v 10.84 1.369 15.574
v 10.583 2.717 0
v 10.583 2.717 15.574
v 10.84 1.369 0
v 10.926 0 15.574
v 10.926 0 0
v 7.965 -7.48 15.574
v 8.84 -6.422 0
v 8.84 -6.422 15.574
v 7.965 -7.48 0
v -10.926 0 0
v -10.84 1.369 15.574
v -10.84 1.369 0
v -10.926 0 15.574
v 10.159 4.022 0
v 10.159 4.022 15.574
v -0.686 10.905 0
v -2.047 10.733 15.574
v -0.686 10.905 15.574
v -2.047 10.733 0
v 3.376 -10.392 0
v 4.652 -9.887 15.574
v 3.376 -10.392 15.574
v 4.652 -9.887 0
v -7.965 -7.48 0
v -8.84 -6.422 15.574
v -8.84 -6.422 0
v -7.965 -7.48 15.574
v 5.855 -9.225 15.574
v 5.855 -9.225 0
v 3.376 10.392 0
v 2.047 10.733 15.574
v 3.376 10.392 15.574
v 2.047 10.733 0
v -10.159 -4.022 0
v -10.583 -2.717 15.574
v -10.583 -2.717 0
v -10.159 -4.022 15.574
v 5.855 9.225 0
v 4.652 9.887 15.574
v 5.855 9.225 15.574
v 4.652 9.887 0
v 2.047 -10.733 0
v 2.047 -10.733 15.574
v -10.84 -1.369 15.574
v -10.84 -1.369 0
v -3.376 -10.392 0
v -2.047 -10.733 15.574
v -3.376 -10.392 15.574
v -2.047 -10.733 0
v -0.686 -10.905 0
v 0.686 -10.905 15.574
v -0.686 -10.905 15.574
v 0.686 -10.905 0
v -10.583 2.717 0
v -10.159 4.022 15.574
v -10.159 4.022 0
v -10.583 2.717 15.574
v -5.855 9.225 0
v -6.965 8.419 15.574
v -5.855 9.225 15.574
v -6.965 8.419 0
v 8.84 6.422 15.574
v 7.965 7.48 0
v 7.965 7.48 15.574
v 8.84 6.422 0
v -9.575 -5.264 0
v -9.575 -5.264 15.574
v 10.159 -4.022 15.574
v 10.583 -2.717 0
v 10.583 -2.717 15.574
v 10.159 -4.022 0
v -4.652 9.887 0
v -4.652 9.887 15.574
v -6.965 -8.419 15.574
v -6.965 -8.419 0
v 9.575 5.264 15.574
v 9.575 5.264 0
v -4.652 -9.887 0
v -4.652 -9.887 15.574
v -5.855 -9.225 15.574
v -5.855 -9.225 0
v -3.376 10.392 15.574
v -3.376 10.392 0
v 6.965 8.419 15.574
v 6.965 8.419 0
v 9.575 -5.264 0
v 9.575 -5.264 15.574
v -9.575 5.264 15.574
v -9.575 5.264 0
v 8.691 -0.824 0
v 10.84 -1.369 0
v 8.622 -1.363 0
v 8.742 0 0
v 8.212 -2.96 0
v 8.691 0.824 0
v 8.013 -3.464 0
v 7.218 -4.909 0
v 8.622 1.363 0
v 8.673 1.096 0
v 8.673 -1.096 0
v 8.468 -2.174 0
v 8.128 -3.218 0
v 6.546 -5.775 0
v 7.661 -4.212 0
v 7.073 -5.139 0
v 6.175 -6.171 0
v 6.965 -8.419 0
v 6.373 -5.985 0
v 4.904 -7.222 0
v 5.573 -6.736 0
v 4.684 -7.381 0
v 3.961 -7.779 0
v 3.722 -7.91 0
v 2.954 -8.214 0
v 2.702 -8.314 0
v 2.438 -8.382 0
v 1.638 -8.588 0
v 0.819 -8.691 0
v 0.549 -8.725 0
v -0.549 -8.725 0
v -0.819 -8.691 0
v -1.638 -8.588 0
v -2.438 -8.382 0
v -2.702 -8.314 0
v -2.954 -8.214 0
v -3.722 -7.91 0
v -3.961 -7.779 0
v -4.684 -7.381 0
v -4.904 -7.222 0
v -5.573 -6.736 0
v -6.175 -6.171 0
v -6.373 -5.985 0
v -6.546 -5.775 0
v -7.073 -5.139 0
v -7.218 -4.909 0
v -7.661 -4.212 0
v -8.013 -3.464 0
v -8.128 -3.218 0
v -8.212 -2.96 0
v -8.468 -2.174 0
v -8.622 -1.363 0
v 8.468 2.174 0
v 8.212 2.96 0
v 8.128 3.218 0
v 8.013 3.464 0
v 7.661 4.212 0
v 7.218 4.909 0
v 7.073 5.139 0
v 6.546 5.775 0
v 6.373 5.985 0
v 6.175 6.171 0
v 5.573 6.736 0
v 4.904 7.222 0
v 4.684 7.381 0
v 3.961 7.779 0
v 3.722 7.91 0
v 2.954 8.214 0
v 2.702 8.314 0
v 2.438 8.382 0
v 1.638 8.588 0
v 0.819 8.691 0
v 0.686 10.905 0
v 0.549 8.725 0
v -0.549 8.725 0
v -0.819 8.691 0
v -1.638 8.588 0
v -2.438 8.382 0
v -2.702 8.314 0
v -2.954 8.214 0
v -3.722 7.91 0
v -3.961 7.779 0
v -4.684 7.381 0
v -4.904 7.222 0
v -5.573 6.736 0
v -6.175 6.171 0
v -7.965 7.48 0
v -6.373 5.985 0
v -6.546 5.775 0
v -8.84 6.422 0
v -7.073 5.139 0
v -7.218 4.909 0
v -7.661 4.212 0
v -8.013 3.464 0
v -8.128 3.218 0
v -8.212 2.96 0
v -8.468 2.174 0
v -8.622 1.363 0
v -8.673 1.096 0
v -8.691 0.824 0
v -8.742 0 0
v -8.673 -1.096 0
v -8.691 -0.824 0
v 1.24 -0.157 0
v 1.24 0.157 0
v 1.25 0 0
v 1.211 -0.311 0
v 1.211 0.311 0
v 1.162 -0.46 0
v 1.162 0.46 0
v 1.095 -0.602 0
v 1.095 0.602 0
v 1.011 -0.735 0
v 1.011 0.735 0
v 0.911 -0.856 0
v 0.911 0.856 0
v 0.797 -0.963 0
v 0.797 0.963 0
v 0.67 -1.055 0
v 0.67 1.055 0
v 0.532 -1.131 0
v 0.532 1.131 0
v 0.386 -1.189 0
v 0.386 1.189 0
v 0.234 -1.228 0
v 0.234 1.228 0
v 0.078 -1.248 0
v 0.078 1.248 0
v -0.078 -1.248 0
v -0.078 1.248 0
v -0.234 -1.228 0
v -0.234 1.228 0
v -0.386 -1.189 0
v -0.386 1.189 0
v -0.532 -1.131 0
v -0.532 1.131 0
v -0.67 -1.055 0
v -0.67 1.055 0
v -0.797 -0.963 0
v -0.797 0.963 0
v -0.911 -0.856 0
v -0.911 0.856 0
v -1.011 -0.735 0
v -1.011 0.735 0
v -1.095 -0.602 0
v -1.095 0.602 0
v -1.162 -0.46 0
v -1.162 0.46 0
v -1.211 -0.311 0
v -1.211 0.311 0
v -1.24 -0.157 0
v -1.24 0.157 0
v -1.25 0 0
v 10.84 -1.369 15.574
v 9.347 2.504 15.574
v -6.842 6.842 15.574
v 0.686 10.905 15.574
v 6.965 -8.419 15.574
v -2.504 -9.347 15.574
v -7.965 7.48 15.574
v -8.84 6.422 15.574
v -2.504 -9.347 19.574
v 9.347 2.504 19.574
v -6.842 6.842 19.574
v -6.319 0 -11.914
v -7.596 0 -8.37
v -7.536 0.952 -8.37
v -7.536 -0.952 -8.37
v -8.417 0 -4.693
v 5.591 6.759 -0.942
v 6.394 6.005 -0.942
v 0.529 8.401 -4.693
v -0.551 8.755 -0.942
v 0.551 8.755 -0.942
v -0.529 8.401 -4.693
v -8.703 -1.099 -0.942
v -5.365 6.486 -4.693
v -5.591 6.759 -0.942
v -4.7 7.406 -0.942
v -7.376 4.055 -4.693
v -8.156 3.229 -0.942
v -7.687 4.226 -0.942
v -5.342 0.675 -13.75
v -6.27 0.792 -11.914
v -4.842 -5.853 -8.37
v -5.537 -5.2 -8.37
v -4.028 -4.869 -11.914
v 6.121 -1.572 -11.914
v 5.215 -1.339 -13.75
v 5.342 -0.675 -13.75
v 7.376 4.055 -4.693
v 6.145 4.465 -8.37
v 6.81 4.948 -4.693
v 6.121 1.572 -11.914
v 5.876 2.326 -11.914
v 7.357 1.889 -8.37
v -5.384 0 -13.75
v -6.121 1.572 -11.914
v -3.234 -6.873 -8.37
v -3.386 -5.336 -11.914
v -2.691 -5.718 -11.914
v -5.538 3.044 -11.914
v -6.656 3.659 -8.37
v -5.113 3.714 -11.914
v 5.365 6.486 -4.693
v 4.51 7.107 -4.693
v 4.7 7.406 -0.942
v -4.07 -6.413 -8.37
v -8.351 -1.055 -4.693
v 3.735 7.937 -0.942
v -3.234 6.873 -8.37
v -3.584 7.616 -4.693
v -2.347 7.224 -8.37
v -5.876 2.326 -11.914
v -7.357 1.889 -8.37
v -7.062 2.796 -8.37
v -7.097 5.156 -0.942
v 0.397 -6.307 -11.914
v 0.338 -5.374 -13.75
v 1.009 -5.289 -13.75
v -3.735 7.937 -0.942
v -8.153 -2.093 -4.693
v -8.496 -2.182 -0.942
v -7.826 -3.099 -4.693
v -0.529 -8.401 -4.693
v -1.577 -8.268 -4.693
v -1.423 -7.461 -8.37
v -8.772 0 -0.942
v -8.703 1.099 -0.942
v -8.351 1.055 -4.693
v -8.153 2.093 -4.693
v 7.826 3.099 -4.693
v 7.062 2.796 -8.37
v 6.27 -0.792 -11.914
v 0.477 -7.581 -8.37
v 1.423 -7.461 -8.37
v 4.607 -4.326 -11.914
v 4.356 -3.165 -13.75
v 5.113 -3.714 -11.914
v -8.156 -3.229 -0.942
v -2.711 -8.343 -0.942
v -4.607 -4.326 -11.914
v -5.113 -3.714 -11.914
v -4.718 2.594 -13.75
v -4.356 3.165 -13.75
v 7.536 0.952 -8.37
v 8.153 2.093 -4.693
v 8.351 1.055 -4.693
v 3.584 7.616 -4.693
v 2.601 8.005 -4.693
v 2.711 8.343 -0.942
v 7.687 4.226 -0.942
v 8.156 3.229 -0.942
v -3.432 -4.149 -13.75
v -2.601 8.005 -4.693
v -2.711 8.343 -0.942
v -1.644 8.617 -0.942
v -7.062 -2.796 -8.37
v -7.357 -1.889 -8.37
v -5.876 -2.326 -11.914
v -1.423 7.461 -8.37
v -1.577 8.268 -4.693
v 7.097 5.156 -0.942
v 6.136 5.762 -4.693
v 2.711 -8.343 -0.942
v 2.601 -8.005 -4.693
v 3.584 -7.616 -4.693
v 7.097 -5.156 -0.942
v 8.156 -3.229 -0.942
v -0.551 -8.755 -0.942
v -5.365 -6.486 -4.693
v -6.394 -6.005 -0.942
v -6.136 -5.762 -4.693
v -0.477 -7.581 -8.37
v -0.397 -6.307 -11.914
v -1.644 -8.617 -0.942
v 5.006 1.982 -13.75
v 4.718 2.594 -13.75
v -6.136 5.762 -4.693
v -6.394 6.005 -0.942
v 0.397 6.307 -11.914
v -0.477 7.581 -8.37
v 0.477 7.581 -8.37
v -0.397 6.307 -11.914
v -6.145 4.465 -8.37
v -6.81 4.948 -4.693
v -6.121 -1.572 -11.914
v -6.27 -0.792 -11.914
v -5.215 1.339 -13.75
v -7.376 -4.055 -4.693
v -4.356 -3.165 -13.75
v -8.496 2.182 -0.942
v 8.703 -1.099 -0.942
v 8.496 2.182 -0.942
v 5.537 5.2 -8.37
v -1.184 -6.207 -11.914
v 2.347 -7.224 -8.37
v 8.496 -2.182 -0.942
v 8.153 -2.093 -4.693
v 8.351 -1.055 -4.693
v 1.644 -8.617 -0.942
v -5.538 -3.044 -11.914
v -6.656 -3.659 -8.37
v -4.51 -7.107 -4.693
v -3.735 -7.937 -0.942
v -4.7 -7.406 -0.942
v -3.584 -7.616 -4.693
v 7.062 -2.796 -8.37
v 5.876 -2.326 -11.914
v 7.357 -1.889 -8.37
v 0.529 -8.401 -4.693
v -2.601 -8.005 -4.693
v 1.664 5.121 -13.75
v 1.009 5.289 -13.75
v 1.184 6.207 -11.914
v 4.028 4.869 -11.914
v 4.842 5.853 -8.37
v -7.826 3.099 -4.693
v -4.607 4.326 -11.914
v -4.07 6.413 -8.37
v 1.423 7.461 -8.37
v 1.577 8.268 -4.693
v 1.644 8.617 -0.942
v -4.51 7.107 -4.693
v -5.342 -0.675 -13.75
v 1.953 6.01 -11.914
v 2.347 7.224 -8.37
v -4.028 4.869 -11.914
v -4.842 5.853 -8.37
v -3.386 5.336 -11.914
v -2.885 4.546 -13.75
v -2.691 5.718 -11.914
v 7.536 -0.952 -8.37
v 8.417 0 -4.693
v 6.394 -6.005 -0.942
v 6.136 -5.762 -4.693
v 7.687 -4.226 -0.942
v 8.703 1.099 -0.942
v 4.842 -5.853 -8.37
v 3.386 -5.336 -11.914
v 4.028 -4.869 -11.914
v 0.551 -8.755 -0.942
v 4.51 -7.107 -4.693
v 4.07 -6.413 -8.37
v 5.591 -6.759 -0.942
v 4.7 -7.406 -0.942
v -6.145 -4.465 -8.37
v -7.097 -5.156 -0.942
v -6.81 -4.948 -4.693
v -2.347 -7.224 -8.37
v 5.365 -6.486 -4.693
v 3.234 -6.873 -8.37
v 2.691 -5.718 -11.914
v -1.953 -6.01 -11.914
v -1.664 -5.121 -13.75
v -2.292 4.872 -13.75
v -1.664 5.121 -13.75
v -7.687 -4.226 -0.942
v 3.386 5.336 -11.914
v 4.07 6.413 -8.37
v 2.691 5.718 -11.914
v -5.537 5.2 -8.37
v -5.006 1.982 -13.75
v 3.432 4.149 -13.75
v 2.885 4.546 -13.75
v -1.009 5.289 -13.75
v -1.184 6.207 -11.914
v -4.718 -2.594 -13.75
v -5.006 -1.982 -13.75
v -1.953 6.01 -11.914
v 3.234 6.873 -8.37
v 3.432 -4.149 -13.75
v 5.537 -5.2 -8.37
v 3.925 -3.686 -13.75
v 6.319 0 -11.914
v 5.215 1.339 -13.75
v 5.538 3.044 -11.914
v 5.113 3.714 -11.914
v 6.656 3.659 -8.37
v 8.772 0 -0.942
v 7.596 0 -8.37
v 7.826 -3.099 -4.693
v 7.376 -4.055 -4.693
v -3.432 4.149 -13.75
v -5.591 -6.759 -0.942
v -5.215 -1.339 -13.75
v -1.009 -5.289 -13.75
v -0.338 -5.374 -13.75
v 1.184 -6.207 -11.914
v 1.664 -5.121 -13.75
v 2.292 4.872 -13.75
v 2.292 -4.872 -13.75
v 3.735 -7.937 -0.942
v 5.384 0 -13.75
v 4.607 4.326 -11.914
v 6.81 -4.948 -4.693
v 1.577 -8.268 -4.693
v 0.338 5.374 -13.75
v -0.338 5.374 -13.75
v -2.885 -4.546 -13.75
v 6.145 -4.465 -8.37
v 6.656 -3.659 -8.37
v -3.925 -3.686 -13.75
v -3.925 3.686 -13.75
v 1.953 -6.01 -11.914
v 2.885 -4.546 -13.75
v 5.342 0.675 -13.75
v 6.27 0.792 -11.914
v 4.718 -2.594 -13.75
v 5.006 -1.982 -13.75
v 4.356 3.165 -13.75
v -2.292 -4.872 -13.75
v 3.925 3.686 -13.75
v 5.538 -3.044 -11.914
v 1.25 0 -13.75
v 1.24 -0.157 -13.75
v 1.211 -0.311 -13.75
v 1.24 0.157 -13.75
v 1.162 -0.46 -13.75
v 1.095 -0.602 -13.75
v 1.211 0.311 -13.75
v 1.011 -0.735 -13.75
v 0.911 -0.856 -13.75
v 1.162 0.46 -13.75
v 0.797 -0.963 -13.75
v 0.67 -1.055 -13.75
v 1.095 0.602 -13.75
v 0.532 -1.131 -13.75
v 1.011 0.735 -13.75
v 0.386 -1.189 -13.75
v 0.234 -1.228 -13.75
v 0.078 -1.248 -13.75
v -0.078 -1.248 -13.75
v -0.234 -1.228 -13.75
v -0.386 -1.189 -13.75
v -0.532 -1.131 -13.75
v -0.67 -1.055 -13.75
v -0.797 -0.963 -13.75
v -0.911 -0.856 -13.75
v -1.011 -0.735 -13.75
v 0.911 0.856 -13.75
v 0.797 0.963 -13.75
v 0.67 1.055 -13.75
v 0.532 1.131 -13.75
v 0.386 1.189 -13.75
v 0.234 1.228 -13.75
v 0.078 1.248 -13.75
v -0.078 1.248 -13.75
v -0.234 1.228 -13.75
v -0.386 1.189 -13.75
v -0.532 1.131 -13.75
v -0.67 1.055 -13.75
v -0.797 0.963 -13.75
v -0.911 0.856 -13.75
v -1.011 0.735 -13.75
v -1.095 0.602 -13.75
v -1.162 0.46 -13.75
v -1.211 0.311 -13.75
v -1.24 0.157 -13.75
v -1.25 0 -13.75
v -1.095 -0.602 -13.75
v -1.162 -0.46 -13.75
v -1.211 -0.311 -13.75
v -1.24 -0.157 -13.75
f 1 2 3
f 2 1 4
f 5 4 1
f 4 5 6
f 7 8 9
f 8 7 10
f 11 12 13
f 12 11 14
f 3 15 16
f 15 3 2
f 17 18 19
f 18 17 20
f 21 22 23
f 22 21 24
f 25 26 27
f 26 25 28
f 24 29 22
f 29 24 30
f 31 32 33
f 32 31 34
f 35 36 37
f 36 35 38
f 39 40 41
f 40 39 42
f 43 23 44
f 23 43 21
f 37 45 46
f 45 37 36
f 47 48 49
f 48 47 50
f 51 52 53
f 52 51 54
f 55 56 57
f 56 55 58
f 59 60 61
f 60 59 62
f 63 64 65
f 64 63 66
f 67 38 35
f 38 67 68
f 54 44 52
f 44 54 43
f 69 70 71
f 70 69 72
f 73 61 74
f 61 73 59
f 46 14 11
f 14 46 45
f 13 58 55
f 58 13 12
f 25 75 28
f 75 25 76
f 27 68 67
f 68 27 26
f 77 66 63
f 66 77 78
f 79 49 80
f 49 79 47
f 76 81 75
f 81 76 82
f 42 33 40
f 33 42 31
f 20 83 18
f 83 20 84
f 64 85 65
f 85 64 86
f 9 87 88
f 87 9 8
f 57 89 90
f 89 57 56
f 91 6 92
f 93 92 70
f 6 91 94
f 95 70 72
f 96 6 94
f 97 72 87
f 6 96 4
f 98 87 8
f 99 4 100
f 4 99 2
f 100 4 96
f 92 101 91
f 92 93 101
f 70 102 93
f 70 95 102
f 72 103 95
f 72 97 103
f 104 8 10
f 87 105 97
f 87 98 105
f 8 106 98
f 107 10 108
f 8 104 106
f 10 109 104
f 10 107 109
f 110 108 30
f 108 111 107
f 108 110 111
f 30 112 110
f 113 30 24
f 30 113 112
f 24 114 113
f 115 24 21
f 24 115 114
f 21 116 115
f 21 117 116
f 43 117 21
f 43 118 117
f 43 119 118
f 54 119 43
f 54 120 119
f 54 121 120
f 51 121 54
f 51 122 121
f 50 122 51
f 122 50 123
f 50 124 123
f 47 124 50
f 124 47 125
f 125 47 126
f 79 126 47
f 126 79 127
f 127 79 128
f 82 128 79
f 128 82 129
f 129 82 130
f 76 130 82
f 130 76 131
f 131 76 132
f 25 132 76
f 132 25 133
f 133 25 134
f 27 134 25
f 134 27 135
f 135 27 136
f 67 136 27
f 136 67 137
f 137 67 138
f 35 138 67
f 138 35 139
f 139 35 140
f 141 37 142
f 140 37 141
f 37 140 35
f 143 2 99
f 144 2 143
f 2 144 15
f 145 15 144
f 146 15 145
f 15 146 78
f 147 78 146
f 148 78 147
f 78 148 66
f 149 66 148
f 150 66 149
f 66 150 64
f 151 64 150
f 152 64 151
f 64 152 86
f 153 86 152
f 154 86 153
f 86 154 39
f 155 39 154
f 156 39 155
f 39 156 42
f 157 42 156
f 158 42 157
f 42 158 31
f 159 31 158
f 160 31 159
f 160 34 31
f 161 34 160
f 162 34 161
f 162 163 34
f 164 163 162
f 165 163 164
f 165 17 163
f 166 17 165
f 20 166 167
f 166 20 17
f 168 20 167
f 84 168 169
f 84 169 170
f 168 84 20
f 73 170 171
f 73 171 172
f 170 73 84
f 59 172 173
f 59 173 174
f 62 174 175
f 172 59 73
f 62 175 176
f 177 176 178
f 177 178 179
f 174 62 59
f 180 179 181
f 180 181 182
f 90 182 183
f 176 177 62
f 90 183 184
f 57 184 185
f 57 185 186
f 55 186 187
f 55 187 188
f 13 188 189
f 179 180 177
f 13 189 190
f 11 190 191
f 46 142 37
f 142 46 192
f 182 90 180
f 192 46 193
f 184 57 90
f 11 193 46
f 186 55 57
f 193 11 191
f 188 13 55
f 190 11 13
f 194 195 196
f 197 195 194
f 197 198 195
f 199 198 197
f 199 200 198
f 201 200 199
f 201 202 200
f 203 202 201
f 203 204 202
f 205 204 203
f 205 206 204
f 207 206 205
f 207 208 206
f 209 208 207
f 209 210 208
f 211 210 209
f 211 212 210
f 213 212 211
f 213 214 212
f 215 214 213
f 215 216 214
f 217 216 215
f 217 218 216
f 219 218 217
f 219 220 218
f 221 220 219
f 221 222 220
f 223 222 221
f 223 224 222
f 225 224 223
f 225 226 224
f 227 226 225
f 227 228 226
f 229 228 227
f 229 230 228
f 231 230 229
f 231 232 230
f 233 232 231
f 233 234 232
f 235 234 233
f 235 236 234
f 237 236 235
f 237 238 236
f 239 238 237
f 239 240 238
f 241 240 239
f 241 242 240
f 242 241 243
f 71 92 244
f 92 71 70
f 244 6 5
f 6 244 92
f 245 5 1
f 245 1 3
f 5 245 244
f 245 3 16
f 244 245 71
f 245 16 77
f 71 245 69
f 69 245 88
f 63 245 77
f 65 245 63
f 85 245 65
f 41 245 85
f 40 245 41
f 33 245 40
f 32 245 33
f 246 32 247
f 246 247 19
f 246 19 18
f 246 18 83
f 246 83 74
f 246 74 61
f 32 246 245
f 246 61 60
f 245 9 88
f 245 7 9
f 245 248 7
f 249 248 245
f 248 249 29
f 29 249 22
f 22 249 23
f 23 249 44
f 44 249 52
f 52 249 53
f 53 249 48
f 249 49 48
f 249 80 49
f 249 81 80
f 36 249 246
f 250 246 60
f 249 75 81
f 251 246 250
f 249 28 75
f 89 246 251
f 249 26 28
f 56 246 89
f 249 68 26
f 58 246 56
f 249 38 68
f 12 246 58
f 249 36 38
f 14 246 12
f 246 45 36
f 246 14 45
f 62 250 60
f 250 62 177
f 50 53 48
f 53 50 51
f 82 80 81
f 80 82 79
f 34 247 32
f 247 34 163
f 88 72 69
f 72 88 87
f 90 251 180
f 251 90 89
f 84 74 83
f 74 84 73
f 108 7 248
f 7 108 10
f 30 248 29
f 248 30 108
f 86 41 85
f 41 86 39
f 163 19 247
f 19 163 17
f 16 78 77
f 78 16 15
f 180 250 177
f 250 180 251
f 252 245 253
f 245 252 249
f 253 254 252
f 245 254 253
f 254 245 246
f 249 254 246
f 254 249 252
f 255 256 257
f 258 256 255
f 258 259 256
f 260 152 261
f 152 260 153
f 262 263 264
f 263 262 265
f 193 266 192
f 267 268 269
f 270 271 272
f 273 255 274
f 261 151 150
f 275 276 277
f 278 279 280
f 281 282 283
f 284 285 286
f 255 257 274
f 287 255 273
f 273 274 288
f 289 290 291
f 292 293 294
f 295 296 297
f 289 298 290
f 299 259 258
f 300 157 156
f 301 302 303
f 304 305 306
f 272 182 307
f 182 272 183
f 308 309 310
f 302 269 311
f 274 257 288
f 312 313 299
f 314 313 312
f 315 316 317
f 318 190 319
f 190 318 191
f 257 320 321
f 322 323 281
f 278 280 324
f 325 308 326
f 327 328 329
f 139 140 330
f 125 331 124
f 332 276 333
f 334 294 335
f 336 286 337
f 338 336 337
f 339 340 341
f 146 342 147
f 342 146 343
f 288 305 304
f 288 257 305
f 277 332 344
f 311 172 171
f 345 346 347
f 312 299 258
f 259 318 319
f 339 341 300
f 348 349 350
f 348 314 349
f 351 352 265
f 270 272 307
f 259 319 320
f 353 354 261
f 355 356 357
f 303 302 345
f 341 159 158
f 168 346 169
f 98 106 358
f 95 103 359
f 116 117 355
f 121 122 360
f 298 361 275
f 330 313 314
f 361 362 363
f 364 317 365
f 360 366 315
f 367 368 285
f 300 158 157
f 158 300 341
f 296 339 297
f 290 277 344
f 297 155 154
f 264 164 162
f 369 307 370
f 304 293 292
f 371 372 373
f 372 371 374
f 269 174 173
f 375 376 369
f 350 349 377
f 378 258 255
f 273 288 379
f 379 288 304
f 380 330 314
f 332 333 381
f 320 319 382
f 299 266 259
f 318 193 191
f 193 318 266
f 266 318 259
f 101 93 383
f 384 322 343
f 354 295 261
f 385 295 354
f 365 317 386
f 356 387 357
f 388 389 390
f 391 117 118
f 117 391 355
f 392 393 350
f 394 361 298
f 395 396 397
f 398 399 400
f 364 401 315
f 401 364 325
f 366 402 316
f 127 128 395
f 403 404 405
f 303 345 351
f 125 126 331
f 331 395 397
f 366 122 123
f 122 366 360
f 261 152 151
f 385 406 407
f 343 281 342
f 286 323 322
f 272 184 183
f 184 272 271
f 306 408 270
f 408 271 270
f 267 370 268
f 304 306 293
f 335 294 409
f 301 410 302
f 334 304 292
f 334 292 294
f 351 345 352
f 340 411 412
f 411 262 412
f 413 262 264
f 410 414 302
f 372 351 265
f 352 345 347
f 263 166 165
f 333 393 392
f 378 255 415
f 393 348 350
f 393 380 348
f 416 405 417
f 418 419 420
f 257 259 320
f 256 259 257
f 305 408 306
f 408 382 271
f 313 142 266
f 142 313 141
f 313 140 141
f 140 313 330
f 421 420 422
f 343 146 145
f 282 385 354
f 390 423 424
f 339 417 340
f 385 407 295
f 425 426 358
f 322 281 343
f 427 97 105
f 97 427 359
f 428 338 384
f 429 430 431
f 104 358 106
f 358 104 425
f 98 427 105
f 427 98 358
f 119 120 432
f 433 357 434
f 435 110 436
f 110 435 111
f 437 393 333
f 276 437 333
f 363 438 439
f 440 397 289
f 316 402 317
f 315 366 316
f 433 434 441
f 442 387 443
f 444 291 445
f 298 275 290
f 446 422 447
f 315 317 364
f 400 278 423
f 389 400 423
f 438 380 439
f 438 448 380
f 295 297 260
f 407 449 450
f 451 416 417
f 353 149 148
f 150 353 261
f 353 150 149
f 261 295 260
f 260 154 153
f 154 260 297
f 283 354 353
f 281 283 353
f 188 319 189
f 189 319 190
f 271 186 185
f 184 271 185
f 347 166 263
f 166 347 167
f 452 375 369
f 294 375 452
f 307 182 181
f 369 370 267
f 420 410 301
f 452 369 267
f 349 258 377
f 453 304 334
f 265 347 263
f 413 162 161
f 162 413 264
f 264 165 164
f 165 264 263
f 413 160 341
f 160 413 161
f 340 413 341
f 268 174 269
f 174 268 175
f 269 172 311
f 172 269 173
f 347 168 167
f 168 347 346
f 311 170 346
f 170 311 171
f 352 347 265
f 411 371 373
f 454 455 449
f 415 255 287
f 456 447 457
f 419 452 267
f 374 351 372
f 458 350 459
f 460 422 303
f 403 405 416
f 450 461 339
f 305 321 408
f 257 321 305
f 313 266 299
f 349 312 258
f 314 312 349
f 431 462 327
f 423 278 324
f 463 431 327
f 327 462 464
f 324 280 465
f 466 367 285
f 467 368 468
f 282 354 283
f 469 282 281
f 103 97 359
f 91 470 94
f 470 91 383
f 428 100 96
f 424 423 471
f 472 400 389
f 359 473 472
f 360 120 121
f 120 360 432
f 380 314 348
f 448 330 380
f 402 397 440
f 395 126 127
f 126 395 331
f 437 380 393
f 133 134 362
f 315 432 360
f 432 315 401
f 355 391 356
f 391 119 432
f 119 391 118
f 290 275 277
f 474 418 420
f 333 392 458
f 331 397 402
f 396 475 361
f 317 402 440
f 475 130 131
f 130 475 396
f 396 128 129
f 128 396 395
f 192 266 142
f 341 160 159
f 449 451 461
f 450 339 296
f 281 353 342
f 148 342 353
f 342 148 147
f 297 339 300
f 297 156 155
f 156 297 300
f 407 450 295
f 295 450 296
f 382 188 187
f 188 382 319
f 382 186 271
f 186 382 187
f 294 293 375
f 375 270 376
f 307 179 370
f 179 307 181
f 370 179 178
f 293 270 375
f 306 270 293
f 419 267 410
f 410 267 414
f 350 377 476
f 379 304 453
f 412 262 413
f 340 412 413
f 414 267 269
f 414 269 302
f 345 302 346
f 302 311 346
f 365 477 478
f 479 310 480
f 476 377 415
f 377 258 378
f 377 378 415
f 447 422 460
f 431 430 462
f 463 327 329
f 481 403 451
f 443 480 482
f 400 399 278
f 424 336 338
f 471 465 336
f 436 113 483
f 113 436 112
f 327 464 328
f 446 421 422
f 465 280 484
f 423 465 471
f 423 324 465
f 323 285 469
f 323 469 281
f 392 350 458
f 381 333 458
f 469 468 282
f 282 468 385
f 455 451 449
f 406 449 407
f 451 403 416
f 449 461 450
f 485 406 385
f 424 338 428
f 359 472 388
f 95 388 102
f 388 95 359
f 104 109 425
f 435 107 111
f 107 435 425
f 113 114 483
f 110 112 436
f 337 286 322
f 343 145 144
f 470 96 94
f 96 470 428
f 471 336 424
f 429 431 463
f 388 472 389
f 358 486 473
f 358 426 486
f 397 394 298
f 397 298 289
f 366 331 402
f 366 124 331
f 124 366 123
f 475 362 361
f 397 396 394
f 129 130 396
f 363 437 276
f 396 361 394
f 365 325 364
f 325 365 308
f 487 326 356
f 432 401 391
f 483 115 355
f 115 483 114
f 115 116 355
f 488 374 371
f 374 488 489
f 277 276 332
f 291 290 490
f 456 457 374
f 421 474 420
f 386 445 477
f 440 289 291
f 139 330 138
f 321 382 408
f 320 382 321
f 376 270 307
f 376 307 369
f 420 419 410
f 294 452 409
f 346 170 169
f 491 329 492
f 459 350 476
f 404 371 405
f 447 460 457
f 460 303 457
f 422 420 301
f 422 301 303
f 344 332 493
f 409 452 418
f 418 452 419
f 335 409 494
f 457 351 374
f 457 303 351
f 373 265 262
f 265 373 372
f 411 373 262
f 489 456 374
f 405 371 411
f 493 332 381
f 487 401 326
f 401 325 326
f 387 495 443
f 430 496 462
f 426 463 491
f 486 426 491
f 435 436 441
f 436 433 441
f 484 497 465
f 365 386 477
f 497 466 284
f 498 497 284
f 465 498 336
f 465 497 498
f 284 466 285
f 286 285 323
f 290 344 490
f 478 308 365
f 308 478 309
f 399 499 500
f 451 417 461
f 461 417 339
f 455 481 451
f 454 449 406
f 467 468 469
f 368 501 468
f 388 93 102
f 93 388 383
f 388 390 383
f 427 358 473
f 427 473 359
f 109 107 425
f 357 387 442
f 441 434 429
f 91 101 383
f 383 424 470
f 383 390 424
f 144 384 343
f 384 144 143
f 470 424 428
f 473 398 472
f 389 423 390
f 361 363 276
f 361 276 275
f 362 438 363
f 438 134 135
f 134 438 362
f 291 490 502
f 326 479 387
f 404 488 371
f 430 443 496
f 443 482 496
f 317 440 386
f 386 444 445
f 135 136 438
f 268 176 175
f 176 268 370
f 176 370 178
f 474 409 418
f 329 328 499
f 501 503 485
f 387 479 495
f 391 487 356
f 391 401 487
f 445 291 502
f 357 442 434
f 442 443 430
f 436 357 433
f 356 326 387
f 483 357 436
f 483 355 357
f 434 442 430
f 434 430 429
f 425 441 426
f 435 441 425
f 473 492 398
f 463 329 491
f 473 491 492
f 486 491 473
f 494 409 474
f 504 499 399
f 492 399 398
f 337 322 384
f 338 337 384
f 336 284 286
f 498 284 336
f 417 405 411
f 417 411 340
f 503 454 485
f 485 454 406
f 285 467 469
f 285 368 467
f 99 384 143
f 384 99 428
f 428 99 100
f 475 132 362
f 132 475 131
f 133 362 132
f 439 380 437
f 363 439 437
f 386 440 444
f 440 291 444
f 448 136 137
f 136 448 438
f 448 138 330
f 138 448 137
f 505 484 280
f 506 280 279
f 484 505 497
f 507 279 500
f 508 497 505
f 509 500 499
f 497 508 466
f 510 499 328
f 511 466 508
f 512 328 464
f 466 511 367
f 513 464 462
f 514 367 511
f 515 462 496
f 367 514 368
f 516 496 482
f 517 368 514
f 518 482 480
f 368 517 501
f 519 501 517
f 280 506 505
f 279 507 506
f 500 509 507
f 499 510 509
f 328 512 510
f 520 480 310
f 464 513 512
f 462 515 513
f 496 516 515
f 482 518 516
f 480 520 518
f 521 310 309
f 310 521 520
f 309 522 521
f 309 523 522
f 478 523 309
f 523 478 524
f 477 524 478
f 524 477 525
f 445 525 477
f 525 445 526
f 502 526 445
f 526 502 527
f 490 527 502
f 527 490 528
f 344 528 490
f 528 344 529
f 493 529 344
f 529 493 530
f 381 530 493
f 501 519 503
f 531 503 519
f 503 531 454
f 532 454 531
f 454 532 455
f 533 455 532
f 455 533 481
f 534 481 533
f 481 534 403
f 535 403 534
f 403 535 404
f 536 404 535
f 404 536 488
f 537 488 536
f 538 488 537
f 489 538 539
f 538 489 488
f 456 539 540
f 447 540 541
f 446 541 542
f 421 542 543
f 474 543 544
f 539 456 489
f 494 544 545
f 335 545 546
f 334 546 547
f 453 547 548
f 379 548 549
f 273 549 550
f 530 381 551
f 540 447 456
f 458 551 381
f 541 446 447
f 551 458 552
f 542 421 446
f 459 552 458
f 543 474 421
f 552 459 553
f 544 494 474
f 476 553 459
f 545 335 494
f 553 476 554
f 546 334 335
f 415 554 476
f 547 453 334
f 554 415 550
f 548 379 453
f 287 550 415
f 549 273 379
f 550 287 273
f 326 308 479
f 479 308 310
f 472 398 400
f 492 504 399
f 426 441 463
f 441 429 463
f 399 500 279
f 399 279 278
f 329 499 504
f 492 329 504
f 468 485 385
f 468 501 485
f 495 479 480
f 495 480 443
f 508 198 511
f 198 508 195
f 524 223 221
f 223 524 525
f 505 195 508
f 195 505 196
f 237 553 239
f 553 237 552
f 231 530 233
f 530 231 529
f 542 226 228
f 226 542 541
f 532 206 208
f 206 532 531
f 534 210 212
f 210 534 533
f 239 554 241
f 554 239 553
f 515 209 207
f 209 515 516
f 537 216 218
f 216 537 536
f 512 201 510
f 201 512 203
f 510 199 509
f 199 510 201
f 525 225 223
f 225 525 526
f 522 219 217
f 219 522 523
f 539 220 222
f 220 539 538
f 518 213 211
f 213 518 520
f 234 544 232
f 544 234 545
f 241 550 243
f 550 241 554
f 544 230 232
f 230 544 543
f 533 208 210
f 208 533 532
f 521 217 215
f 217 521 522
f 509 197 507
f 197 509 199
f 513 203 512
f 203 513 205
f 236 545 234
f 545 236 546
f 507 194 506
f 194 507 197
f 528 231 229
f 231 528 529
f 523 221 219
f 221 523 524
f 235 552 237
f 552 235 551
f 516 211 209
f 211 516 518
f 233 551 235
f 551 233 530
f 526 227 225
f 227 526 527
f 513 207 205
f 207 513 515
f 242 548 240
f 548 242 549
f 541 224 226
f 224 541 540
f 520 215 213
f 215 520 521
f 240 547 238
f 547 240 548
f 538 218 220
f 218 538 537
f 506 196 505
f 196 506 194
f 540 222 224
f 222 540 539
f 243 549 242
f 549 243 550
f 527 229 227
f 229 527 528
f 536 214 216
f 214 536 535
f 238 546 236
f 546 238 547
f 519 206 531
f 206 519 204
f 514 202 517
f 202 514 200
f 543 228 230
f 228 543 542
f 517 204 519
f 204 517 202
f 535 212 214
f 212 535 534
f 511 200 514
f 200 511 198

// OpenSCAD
// file: hub.scad
/* Hub module for omniwheel by Shira Epstein
 * This work is licensed under the Creative Commons Attribution 4.0 International License.
 * To view a copy of this license, visit http://creativecommons.org/licenses/by/4.0/.
 */

//Variables
hub_clearance = 1.5; //Clearance between the hub and the beads
wheelclearance = 2; //how much of a gap to allow between the two halves of the wheel
fitdepth = 4; //depth of the triangular key that allows a snap fit of the two halves of the omniwheel

printoffset = 0.25; // Pull the positive triangular key in by this much, to accomodate good fit w/negative
keyoffset = 1;//how far to pull in the corners of the triangular key from the edge of the hub center

r=30;


//Computed Variables
hub_center_r = sqrt(2)*r -r -hub_clearance; //Hub central radius
tri_r_n = hub_center_r - keyoffset; //Radius of circle into which triangular hole is inscribed
tri_r_p = tri_r_n - printoffset; //Radius of circle into which triangular key is inscribed

// - printoffset; //

//Central part of the hub
module hub_center(){
	linear_extrude(height=((2-sqrt(2))*r) + wheelclearance - fitdepth,center=false) {
		circle(hub_center_r);
	}
}

//The positive triangular key
module key_pos() {

	rotate([0,0,45]){
		translate([0,0,((2-sqrt(2))*r) + wheelclearance - fitdepth]) {
			linear_extrude(height=fitdepth, center=false) {
				polygon([[0,tri_r_p],[-sqrt(3)*tri_r_p/2,-tri_r_p/2],[sqrt(3)*tri_r_p/2,-tri_r_p/2]]);
			}
		}
	}
}

module hub_center_positive() {
	hub_center();
	key_pos();
}

hub_center_positive();
// file: bead.scad
/* Bead module for omniwheel by Shira Epstein
 * This work is licensed under the Creative Commons Attribution 4.0 International License.
 * To view a copy of this license, visit http://creativecommons.org/licenses/by/4.0/.
 */

//Code

//Create the 2D shape of the bead
module beadshape( bead_length, w_rad ) {
	intersection() {
		polygon([[0,-(bead_length/2)],[w_rad,-(bead_length/2)],[w_rad,(bead_length/2)],[0,(bead_length/2)]]);
		rotate([0,0,-45]) {	
			translate([-w_rad/2,-w_rad/2,0]){
				difference() {
					circle(w_rad);
					polygon([[-w_rad,-w_rad],[w_rad,-w_rad],[w_rad,0],[0,w_rad],[-w_rad,w_rad]]);
				}
			}
		}
	}
}

//Create the 3d shape of the bead
module bead( bead_length, w_rad, central_hole_rad) {
	difference() {
		rotate_extrude(){ beadshape( bead_length, w_rad );	}
		linear_extrude(height=sqrt(2)*w_rad,center=true) { circle(central_hole_rad);}
	}
}

//Show 4 beads arranged along the wheel
module beads() {
	translate([ w_r/2,	 w_r/2,	0])	{ rotate([ 45,90,0])	{ bead(); } }
	translate([-w_r/2,	 w_r/2,	0]) 	{ rotate([-45,90,0])	{ bead(); } }
	translate([-w_r/2,	-w_r/2,	0])	{ rotate([ 45,90,0])	{ bead(); } }
	translate([ w_r/2, -w_r/2,	0])	{ rotate([-45,90,0])	{ bead(); } }
}
// main file
/* Main module for omniwheel by Shira Epstein
 * This work is licensed under the Creative Commons Attribution 4.0 International License.
 * To view a copy of this license, visit http://creativecommons.org/licenses/by/4.0/.
 */

include <bead.scad>;
include <hub.scad>;

//Variables
w_r = 30; //Radius of the wheel
b_n_rad = 2.5/2; //Size of the radius of the central bead hole, loose fit for the nail.
nail_length = 32; //Length of the nail tip to head
nail_support = 2; //At each end, length of the nail that will be supported
wiggle_room = 0.25; //Allow the bead to wiggle a small amount along the nail to reduce friction

//Computed variables
b_l = nail_length - nail_support*2 - wiggle_room*2;

//Code

$fn = 50;

bead(b_l, w_r, b_n_rad);
